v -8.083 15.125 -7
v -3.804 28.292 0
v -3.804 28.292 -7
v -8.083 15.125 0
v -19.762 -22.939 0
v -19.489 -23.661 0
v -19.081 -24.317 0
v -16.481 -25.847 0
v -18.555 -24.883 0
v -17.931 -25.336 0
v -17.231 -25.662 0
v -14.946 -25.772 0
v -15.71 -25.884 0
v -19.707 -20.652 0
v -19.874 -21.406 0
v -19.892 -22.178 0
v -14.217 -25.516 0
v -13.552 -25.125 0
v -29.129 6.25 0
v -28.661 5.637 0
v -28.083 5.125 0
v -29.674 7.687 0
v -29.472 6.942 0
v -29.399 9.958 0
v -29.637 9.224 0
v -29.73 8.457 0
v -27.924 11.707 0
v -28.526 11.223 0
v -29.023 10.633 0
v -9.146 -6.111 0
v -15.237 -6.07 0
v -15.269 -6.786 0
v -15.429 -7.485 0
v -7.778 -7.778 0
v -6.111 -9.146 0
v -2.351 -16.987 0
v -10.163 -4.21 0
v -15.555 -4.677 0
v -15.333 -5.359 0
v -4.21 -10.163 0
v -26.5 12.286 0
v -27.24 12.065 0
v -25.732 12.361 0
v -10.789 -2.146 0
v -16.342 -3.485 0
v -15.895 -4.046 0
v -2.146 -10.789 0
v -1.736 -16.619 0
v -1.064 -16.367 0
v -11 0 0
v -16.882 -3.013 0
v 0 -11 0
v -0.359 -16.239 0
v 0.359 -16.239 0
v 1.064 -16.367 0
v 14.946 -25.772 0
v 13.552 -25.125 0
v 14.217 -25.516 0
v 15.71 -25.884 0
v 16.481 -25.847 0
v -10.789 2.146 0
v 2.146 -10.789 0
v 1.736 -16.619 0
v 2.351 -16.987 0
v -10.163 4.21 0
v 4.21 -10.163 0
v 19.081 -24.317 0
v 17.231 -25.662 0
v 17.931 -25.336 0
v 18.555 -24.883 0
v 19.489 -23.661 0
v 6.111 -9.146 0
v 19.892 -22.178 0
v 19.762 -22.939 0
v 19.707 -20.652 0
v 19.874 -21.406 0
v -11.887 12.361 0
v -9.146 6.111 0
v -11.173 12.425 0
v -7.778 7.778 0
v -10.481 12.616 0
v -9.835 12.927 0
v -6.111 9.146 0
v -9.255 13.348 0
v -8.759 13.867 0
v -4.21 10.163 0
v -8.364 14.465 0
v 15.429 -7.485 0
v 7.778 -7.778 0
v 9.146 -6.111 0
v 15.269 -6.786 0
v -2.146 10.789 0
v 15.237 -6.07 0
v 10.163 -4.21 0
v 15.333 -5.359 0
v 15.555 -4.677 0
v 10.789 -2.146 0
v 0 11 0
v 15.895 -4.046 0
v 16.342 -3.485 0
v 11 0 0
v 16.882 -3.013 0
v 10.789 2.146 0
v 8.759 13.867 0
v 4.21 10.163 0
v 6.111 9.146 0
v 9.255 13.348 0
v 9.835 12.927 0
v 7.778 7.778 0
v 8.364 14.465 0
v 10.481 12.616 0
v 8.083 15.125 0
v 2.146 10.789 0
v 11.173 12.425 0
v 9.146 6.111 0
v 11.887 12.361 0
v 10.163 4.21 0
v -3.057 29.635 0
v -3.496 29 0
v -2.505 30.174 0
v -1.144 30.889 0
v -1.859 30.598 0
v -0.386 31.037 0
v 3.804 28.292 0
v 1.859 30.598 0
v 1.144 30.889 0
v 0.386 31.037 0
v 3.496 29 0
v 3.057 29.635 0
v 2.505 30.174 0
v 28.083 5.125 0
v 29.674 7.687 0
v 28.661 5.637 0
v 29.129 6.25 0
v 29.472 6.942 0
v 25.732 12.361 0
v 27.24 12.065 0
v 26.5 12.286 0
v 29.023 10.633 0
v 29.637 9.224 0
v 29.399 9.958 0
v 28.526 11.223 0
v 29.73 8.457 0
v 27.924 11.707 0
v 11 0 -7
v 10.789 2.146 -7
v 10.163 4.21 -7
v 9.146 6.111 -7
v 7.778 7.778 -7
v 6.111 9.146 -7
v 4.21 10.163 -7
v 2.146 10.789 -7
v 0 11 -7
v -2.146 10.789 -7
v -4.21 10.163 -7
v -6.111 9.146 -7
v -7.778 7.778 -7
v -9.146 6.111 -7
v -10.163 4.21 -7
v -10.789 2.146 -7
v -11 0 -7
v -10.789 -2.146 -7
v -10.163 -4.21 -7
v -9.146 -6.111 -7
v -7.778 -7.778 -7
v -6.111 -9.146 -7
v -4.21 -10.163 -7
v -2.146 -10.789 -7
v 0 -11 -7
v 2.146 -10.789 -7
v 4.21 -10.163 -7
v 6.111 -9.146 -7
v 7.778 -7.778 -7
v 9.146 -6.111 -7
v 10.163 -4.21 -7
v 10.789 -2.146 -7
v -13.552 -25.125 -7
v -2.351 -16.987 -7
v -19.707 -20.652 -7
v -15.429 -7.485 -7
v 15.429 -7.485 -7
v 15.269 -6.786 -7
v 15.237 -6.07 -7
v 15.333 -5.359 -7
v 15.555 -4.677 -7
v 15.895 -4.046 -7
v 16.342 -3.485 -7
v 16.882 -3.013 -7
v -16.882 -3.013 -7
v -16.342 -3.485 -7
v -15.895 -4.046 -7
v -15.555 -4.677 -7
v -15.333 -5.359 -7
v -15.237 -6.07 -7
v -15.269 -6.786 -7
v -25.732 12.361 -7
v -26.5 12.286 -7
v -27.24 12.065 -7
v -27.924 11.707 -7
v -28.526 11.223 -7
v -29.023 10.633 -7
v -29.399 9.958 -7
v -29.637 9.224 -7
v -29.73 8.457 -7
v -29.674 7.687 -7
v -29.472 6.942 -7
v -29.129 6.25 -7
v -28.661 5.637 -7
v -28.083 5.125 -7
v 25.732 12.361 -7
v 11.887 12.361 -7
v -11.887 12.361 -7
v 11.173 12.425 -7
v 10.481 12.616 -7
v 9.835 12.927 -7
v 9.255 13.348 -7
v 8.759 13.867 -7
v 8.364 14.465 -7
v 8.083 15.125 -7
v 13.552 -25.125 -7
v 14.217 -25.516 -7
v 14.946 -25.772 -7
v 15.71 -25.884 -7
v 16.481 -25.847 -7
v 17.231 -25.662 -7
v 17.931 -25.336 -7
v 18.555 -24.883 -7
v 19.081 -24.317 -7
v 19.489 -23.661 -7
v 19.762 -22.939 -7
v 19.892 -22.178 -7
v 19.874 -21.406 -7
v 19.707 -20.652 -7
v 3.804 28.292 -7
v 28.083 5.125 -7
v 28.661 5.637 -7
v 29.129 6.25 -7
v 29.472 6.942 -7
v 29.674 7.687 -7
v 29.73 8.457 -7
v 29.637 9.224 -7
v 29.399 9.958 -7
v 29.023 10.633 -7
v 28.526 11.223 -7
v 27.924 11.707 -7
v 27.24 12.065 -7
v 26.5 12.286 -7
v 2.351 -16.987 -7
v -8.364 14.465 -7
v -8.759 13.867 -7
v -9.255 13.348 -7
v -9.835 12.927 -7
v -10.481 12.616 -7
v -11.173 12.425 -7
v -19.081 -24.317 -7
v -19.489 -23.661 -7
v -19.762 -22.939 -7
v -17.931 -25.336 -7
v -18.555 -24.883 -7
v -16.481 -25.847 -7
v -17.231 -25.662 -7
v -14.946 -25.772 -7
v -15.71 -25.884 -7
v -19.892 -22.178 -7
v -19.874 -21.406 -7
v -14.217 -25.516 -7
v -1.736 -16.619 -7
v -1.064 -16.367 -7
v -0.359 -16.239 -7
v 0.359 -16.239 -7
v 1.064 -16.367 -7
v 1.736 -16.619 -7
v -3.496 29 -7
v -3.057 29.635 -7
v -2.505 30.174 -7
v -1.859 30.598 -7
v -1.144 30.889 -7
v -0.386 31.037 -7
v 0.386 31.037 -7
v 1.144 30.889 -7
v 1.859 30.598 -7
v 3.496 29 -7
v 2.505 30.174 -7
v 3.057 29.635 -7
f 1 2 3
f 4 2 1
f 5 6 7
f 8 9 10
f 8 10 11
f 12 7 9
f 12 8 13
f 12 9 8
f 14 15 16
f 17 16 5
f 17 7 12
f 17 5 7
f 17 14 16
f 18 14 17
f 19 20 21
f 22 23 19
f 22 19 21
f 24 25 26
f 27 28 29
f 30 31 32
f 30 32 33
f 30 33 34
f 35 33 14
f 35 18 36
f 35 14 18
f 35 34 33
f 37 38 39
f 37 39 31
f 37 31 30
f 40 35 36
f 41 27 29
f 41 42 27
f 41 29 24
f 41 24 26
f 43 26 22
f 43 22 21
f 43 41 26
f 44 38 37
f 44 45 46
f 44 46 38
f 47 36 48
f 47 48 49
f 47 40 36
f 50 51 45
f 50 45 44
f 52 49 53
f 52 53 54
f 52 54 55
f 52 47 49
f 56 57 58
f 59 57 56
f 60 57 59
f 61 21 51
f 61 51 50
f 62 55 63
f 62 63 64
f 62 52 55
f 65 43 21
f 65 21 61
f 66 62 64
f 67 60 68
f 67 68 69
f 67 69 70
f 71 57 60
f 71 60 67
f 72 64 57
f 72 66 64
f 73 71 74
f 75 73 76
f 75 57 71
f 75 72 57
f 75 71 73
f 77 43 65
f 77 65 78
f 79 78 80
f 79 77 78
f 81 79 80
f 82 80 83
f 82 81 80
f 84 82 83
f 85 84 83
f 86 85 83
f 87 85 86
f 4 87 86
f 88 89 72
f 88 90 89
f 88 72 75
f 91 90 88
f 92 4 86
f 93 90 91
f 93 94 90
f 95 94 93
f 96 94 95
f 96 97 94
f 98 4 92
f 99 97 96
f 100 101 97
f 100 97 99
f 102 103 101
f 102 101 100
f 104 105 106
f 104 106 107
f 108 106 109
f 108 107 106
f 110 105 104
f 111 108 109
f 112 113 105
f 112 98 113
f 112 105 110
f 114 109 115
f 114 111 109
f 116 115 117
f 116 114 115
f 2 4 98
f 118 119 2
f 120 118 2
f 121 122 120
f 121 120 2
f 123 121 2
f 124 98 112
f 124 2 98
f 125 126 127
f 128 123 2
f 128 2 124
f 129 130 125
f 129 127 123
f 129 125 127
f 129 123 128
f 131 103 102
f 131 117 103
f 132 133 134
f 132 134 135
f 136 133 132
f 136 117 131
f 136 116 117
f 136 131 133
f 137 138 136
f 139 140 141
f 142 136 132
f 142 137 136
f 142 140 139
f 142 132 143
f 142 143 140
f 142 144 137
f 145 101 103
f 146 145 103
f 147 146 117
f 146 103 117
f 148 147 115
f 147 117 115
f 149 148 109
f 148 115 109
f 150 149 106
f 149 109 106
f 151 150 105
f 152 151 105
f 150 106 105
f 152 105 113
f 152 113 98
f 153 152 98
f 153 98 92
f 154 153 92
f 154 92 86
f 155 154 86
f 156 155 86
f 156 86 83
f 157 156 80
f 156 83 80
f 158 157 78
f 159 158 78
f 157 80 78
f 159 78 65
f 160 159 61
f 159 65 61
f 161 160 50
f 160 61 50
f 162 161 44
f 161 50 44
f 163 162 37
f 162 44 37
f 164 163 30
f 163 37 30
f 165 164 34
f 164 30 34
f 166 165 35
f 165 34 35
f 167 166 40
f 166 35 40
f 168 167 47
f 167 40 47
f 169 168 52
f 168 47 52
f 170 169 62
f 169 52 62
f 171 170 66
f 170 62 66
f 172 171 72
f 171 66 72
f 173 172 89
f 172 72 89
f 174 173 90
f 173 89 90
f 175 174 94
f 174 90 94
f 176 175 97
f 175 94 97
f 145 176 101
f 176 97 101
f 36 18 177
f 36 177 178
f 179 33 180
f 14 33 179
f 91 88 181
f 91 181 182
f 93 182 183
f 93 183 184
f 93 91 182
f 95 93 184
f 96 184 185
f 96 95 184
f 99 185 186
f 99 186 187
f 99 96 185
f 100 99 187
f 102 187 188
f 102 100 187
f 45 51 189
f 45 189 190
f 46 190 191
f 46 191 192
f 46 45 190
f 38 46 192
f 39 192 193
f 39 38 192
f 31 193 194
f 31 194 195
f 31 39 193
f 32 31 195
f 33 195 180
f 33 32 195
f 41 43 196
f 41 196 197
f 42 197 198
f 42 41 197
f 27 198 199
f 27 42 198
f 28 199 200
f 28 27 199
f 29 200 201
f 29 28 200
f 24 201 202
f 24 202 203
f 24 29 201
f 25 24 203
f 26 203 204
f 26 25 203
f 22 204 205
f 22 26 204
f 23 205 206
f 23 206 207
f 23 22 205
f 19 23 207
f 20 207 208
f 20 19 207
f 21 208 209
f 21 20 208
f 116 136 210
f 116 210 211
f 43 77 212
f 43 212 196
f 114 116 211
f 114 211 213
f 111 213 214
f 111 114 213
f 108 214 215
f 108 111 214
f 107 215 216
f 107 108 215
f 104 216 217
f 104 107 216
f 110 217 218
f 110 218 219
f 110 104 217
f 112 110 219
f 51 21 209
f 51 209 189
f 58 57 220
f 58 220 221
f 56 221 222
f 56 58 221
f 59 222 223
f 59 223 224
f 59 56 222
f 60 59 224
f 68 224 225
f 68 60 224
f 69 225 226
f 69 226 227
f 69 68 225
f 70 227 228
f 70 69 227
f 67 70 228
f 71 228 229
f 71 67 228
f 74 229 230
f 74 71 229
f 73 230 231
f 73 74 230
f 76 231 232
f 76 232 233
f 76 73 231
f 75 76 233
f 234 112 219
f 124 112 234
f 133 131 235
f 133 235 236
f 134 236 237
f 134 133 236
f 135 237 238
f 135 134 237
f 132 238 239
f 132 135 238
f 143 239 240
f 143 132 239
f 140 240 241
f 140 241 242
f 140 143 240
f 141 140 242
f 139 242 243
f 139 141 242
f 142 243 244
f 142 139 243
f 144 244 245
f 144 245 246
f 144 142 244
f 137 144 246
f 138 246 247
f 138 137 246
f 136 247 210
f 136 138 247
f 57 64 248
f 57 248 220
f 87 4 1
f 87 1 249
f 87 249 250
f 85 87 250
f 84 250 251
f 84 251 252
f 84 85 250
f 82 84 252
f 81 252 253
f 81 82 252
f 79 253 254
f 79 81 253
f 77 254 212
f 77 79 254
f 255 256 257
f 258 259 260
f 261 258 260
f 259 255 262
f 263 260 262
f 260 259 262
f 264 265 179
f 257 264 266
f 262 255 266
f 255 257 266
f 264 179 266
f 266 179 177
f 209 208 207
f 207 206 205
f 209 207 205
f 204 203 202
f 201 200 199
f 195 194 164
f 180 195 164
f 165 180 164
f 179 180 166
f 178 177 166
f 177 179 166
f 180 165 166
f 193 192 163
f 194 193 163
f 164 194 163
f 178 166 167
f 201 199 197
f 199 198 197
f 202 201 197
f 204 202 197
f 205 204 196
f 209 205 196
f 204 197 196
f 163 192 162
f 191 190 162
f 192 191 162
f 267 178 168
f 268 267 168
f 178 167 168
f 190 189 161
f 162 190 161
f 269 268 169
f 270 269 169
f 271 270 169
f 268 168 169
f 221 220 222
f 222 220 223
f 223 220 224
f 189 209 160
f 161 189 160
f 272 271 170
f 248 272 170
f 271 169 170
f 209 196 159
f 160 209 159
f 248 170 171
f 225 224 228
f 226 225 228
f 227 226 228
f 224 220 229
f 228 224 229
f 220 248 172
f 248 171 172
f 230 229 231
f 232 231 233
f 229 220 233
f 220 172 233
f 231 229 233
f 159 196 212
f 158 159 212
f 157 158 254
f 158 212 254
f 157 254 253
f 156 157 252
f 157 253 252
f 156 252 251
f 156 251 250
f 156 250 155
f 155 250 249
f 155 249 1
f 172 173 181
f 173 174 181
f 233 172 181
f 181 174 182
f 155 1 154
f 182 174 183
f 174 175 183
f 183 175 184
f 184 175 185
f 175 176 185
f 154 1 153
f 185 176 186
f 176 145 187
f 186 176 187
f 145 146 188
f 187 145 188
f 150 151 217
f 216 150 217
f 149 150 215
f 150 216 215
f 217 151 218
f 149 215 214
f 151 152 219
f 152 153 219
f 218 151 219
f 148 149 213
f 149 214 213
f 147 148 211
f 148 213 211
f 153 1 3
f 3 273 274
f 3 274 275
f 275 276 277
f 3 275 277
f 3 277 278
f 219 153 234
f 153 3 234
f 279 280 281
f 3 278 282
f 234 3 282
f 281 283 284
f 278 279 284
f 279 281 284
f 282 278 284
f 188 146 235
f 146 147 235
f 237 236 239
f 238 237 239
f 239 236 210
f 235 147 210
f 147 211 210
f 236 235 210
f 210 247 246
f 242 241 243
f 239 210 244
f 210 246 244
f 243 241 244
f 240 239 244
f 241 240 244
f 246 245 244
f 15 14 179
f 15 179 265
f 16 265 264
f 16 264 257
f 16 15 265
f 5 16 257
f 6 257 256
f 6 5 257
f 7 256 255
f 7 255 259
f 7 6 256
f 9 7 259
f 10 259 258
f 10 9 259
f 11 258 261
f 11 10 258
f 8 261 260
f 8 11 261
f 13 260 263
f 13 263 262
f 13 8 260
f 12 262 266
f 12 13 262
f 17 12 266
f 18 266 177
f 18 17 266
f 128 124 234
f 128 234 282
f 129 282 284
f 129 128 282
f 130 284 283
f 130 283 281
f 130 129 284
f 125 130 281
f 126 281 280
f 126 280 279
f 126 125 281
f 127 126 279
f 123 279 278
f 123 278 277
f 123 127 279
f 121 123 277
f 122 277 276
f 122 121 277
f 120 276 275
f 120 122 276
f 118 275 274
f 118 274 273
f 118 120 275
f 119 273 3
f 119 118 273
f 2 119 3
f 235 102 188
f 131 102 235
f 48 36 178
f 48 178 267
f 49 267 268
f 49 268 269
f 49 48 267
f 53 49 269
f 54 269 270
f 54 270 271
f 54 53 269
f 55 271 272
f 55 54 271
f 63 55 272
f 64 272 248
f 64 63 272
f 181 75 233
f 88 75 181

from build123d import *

# Parameters (mm, degrees)
F0_R     = 11
F1_DEPTH = 7


with BuildPart() as f1:
    # F0 (on Top) → F1 (new body)
    with BuildSketch(Plane.XY):
        with BuildLine():
            ThreePointArc((3.804226, 28.291796), (0, 31.055728), (-3.804226, 28.291796))
            Line((-3.804226, 28.291796), (-8.082504, 15.124612))
            ThreePointArc((-8.082504, 15.124612), (-9.535589, 13.124612), (-11.88673, 12.36068))
            Line((-11.88673, 12.36068), (-25.731527, 12.36068))
            ThreePointArc((-25.731527, 12.36068), (-29.535753, 9.596748), (-28.082668, 5.124612))
            Line((-28.082668, 5.124612), (-16.881992, -3.013156))
            ThreePointArc((-16.881992, -3.013156), (-15.428907, -5.013156), (-15.428907, -7.485292))
            Line((-15.428907, -7.485292), (-19.707184, -20.652476))
            ThreePointArc((-19.707184, -20.652476), (-18.254099, -25.124612), (-13.551817, -25.124612))
            Line((-13.551817, -25.124612), (-2.351141, -16.986844))
            ThreePointArc((-2.351141, -16.986844), (0, -16.222912), (2.351141, -16.986844))
            Line((2.351141, -16.986844), (13.551817, -25.124612))
            ThreePointArc((13.551817, -25.124612), (18.254099, -25.124612), (19.707184, -20.652476))
            Line((19.707184, -20.652476), (15.428907, -7.485292))
            ThreePointArc((15.428907, -7.485292), (15.428907, -5.013156), (16.881992, -3.013156))
            Line((16.881992, -3.013156), (28.082668, 5.124612))
            ThreePointArc((28.082668, 5.124612), (29.535753, 9.596748), (25.731527, 12.36068))
            Line((25.731527, 12.36068), (11.88673, 12.36068))
            ThreePointArc((11.88673, 12.36068), (9.535589, 13.124612), (8.082504, 15.124612))
            Line((8.082504, 15.124612), (3.804226, 28.291796))
        make_face()
        Circle(F0_R, mode=Mode.SUBTRACT)
    extrude(amount=-F1_DEPTH)


solid = f1.part
